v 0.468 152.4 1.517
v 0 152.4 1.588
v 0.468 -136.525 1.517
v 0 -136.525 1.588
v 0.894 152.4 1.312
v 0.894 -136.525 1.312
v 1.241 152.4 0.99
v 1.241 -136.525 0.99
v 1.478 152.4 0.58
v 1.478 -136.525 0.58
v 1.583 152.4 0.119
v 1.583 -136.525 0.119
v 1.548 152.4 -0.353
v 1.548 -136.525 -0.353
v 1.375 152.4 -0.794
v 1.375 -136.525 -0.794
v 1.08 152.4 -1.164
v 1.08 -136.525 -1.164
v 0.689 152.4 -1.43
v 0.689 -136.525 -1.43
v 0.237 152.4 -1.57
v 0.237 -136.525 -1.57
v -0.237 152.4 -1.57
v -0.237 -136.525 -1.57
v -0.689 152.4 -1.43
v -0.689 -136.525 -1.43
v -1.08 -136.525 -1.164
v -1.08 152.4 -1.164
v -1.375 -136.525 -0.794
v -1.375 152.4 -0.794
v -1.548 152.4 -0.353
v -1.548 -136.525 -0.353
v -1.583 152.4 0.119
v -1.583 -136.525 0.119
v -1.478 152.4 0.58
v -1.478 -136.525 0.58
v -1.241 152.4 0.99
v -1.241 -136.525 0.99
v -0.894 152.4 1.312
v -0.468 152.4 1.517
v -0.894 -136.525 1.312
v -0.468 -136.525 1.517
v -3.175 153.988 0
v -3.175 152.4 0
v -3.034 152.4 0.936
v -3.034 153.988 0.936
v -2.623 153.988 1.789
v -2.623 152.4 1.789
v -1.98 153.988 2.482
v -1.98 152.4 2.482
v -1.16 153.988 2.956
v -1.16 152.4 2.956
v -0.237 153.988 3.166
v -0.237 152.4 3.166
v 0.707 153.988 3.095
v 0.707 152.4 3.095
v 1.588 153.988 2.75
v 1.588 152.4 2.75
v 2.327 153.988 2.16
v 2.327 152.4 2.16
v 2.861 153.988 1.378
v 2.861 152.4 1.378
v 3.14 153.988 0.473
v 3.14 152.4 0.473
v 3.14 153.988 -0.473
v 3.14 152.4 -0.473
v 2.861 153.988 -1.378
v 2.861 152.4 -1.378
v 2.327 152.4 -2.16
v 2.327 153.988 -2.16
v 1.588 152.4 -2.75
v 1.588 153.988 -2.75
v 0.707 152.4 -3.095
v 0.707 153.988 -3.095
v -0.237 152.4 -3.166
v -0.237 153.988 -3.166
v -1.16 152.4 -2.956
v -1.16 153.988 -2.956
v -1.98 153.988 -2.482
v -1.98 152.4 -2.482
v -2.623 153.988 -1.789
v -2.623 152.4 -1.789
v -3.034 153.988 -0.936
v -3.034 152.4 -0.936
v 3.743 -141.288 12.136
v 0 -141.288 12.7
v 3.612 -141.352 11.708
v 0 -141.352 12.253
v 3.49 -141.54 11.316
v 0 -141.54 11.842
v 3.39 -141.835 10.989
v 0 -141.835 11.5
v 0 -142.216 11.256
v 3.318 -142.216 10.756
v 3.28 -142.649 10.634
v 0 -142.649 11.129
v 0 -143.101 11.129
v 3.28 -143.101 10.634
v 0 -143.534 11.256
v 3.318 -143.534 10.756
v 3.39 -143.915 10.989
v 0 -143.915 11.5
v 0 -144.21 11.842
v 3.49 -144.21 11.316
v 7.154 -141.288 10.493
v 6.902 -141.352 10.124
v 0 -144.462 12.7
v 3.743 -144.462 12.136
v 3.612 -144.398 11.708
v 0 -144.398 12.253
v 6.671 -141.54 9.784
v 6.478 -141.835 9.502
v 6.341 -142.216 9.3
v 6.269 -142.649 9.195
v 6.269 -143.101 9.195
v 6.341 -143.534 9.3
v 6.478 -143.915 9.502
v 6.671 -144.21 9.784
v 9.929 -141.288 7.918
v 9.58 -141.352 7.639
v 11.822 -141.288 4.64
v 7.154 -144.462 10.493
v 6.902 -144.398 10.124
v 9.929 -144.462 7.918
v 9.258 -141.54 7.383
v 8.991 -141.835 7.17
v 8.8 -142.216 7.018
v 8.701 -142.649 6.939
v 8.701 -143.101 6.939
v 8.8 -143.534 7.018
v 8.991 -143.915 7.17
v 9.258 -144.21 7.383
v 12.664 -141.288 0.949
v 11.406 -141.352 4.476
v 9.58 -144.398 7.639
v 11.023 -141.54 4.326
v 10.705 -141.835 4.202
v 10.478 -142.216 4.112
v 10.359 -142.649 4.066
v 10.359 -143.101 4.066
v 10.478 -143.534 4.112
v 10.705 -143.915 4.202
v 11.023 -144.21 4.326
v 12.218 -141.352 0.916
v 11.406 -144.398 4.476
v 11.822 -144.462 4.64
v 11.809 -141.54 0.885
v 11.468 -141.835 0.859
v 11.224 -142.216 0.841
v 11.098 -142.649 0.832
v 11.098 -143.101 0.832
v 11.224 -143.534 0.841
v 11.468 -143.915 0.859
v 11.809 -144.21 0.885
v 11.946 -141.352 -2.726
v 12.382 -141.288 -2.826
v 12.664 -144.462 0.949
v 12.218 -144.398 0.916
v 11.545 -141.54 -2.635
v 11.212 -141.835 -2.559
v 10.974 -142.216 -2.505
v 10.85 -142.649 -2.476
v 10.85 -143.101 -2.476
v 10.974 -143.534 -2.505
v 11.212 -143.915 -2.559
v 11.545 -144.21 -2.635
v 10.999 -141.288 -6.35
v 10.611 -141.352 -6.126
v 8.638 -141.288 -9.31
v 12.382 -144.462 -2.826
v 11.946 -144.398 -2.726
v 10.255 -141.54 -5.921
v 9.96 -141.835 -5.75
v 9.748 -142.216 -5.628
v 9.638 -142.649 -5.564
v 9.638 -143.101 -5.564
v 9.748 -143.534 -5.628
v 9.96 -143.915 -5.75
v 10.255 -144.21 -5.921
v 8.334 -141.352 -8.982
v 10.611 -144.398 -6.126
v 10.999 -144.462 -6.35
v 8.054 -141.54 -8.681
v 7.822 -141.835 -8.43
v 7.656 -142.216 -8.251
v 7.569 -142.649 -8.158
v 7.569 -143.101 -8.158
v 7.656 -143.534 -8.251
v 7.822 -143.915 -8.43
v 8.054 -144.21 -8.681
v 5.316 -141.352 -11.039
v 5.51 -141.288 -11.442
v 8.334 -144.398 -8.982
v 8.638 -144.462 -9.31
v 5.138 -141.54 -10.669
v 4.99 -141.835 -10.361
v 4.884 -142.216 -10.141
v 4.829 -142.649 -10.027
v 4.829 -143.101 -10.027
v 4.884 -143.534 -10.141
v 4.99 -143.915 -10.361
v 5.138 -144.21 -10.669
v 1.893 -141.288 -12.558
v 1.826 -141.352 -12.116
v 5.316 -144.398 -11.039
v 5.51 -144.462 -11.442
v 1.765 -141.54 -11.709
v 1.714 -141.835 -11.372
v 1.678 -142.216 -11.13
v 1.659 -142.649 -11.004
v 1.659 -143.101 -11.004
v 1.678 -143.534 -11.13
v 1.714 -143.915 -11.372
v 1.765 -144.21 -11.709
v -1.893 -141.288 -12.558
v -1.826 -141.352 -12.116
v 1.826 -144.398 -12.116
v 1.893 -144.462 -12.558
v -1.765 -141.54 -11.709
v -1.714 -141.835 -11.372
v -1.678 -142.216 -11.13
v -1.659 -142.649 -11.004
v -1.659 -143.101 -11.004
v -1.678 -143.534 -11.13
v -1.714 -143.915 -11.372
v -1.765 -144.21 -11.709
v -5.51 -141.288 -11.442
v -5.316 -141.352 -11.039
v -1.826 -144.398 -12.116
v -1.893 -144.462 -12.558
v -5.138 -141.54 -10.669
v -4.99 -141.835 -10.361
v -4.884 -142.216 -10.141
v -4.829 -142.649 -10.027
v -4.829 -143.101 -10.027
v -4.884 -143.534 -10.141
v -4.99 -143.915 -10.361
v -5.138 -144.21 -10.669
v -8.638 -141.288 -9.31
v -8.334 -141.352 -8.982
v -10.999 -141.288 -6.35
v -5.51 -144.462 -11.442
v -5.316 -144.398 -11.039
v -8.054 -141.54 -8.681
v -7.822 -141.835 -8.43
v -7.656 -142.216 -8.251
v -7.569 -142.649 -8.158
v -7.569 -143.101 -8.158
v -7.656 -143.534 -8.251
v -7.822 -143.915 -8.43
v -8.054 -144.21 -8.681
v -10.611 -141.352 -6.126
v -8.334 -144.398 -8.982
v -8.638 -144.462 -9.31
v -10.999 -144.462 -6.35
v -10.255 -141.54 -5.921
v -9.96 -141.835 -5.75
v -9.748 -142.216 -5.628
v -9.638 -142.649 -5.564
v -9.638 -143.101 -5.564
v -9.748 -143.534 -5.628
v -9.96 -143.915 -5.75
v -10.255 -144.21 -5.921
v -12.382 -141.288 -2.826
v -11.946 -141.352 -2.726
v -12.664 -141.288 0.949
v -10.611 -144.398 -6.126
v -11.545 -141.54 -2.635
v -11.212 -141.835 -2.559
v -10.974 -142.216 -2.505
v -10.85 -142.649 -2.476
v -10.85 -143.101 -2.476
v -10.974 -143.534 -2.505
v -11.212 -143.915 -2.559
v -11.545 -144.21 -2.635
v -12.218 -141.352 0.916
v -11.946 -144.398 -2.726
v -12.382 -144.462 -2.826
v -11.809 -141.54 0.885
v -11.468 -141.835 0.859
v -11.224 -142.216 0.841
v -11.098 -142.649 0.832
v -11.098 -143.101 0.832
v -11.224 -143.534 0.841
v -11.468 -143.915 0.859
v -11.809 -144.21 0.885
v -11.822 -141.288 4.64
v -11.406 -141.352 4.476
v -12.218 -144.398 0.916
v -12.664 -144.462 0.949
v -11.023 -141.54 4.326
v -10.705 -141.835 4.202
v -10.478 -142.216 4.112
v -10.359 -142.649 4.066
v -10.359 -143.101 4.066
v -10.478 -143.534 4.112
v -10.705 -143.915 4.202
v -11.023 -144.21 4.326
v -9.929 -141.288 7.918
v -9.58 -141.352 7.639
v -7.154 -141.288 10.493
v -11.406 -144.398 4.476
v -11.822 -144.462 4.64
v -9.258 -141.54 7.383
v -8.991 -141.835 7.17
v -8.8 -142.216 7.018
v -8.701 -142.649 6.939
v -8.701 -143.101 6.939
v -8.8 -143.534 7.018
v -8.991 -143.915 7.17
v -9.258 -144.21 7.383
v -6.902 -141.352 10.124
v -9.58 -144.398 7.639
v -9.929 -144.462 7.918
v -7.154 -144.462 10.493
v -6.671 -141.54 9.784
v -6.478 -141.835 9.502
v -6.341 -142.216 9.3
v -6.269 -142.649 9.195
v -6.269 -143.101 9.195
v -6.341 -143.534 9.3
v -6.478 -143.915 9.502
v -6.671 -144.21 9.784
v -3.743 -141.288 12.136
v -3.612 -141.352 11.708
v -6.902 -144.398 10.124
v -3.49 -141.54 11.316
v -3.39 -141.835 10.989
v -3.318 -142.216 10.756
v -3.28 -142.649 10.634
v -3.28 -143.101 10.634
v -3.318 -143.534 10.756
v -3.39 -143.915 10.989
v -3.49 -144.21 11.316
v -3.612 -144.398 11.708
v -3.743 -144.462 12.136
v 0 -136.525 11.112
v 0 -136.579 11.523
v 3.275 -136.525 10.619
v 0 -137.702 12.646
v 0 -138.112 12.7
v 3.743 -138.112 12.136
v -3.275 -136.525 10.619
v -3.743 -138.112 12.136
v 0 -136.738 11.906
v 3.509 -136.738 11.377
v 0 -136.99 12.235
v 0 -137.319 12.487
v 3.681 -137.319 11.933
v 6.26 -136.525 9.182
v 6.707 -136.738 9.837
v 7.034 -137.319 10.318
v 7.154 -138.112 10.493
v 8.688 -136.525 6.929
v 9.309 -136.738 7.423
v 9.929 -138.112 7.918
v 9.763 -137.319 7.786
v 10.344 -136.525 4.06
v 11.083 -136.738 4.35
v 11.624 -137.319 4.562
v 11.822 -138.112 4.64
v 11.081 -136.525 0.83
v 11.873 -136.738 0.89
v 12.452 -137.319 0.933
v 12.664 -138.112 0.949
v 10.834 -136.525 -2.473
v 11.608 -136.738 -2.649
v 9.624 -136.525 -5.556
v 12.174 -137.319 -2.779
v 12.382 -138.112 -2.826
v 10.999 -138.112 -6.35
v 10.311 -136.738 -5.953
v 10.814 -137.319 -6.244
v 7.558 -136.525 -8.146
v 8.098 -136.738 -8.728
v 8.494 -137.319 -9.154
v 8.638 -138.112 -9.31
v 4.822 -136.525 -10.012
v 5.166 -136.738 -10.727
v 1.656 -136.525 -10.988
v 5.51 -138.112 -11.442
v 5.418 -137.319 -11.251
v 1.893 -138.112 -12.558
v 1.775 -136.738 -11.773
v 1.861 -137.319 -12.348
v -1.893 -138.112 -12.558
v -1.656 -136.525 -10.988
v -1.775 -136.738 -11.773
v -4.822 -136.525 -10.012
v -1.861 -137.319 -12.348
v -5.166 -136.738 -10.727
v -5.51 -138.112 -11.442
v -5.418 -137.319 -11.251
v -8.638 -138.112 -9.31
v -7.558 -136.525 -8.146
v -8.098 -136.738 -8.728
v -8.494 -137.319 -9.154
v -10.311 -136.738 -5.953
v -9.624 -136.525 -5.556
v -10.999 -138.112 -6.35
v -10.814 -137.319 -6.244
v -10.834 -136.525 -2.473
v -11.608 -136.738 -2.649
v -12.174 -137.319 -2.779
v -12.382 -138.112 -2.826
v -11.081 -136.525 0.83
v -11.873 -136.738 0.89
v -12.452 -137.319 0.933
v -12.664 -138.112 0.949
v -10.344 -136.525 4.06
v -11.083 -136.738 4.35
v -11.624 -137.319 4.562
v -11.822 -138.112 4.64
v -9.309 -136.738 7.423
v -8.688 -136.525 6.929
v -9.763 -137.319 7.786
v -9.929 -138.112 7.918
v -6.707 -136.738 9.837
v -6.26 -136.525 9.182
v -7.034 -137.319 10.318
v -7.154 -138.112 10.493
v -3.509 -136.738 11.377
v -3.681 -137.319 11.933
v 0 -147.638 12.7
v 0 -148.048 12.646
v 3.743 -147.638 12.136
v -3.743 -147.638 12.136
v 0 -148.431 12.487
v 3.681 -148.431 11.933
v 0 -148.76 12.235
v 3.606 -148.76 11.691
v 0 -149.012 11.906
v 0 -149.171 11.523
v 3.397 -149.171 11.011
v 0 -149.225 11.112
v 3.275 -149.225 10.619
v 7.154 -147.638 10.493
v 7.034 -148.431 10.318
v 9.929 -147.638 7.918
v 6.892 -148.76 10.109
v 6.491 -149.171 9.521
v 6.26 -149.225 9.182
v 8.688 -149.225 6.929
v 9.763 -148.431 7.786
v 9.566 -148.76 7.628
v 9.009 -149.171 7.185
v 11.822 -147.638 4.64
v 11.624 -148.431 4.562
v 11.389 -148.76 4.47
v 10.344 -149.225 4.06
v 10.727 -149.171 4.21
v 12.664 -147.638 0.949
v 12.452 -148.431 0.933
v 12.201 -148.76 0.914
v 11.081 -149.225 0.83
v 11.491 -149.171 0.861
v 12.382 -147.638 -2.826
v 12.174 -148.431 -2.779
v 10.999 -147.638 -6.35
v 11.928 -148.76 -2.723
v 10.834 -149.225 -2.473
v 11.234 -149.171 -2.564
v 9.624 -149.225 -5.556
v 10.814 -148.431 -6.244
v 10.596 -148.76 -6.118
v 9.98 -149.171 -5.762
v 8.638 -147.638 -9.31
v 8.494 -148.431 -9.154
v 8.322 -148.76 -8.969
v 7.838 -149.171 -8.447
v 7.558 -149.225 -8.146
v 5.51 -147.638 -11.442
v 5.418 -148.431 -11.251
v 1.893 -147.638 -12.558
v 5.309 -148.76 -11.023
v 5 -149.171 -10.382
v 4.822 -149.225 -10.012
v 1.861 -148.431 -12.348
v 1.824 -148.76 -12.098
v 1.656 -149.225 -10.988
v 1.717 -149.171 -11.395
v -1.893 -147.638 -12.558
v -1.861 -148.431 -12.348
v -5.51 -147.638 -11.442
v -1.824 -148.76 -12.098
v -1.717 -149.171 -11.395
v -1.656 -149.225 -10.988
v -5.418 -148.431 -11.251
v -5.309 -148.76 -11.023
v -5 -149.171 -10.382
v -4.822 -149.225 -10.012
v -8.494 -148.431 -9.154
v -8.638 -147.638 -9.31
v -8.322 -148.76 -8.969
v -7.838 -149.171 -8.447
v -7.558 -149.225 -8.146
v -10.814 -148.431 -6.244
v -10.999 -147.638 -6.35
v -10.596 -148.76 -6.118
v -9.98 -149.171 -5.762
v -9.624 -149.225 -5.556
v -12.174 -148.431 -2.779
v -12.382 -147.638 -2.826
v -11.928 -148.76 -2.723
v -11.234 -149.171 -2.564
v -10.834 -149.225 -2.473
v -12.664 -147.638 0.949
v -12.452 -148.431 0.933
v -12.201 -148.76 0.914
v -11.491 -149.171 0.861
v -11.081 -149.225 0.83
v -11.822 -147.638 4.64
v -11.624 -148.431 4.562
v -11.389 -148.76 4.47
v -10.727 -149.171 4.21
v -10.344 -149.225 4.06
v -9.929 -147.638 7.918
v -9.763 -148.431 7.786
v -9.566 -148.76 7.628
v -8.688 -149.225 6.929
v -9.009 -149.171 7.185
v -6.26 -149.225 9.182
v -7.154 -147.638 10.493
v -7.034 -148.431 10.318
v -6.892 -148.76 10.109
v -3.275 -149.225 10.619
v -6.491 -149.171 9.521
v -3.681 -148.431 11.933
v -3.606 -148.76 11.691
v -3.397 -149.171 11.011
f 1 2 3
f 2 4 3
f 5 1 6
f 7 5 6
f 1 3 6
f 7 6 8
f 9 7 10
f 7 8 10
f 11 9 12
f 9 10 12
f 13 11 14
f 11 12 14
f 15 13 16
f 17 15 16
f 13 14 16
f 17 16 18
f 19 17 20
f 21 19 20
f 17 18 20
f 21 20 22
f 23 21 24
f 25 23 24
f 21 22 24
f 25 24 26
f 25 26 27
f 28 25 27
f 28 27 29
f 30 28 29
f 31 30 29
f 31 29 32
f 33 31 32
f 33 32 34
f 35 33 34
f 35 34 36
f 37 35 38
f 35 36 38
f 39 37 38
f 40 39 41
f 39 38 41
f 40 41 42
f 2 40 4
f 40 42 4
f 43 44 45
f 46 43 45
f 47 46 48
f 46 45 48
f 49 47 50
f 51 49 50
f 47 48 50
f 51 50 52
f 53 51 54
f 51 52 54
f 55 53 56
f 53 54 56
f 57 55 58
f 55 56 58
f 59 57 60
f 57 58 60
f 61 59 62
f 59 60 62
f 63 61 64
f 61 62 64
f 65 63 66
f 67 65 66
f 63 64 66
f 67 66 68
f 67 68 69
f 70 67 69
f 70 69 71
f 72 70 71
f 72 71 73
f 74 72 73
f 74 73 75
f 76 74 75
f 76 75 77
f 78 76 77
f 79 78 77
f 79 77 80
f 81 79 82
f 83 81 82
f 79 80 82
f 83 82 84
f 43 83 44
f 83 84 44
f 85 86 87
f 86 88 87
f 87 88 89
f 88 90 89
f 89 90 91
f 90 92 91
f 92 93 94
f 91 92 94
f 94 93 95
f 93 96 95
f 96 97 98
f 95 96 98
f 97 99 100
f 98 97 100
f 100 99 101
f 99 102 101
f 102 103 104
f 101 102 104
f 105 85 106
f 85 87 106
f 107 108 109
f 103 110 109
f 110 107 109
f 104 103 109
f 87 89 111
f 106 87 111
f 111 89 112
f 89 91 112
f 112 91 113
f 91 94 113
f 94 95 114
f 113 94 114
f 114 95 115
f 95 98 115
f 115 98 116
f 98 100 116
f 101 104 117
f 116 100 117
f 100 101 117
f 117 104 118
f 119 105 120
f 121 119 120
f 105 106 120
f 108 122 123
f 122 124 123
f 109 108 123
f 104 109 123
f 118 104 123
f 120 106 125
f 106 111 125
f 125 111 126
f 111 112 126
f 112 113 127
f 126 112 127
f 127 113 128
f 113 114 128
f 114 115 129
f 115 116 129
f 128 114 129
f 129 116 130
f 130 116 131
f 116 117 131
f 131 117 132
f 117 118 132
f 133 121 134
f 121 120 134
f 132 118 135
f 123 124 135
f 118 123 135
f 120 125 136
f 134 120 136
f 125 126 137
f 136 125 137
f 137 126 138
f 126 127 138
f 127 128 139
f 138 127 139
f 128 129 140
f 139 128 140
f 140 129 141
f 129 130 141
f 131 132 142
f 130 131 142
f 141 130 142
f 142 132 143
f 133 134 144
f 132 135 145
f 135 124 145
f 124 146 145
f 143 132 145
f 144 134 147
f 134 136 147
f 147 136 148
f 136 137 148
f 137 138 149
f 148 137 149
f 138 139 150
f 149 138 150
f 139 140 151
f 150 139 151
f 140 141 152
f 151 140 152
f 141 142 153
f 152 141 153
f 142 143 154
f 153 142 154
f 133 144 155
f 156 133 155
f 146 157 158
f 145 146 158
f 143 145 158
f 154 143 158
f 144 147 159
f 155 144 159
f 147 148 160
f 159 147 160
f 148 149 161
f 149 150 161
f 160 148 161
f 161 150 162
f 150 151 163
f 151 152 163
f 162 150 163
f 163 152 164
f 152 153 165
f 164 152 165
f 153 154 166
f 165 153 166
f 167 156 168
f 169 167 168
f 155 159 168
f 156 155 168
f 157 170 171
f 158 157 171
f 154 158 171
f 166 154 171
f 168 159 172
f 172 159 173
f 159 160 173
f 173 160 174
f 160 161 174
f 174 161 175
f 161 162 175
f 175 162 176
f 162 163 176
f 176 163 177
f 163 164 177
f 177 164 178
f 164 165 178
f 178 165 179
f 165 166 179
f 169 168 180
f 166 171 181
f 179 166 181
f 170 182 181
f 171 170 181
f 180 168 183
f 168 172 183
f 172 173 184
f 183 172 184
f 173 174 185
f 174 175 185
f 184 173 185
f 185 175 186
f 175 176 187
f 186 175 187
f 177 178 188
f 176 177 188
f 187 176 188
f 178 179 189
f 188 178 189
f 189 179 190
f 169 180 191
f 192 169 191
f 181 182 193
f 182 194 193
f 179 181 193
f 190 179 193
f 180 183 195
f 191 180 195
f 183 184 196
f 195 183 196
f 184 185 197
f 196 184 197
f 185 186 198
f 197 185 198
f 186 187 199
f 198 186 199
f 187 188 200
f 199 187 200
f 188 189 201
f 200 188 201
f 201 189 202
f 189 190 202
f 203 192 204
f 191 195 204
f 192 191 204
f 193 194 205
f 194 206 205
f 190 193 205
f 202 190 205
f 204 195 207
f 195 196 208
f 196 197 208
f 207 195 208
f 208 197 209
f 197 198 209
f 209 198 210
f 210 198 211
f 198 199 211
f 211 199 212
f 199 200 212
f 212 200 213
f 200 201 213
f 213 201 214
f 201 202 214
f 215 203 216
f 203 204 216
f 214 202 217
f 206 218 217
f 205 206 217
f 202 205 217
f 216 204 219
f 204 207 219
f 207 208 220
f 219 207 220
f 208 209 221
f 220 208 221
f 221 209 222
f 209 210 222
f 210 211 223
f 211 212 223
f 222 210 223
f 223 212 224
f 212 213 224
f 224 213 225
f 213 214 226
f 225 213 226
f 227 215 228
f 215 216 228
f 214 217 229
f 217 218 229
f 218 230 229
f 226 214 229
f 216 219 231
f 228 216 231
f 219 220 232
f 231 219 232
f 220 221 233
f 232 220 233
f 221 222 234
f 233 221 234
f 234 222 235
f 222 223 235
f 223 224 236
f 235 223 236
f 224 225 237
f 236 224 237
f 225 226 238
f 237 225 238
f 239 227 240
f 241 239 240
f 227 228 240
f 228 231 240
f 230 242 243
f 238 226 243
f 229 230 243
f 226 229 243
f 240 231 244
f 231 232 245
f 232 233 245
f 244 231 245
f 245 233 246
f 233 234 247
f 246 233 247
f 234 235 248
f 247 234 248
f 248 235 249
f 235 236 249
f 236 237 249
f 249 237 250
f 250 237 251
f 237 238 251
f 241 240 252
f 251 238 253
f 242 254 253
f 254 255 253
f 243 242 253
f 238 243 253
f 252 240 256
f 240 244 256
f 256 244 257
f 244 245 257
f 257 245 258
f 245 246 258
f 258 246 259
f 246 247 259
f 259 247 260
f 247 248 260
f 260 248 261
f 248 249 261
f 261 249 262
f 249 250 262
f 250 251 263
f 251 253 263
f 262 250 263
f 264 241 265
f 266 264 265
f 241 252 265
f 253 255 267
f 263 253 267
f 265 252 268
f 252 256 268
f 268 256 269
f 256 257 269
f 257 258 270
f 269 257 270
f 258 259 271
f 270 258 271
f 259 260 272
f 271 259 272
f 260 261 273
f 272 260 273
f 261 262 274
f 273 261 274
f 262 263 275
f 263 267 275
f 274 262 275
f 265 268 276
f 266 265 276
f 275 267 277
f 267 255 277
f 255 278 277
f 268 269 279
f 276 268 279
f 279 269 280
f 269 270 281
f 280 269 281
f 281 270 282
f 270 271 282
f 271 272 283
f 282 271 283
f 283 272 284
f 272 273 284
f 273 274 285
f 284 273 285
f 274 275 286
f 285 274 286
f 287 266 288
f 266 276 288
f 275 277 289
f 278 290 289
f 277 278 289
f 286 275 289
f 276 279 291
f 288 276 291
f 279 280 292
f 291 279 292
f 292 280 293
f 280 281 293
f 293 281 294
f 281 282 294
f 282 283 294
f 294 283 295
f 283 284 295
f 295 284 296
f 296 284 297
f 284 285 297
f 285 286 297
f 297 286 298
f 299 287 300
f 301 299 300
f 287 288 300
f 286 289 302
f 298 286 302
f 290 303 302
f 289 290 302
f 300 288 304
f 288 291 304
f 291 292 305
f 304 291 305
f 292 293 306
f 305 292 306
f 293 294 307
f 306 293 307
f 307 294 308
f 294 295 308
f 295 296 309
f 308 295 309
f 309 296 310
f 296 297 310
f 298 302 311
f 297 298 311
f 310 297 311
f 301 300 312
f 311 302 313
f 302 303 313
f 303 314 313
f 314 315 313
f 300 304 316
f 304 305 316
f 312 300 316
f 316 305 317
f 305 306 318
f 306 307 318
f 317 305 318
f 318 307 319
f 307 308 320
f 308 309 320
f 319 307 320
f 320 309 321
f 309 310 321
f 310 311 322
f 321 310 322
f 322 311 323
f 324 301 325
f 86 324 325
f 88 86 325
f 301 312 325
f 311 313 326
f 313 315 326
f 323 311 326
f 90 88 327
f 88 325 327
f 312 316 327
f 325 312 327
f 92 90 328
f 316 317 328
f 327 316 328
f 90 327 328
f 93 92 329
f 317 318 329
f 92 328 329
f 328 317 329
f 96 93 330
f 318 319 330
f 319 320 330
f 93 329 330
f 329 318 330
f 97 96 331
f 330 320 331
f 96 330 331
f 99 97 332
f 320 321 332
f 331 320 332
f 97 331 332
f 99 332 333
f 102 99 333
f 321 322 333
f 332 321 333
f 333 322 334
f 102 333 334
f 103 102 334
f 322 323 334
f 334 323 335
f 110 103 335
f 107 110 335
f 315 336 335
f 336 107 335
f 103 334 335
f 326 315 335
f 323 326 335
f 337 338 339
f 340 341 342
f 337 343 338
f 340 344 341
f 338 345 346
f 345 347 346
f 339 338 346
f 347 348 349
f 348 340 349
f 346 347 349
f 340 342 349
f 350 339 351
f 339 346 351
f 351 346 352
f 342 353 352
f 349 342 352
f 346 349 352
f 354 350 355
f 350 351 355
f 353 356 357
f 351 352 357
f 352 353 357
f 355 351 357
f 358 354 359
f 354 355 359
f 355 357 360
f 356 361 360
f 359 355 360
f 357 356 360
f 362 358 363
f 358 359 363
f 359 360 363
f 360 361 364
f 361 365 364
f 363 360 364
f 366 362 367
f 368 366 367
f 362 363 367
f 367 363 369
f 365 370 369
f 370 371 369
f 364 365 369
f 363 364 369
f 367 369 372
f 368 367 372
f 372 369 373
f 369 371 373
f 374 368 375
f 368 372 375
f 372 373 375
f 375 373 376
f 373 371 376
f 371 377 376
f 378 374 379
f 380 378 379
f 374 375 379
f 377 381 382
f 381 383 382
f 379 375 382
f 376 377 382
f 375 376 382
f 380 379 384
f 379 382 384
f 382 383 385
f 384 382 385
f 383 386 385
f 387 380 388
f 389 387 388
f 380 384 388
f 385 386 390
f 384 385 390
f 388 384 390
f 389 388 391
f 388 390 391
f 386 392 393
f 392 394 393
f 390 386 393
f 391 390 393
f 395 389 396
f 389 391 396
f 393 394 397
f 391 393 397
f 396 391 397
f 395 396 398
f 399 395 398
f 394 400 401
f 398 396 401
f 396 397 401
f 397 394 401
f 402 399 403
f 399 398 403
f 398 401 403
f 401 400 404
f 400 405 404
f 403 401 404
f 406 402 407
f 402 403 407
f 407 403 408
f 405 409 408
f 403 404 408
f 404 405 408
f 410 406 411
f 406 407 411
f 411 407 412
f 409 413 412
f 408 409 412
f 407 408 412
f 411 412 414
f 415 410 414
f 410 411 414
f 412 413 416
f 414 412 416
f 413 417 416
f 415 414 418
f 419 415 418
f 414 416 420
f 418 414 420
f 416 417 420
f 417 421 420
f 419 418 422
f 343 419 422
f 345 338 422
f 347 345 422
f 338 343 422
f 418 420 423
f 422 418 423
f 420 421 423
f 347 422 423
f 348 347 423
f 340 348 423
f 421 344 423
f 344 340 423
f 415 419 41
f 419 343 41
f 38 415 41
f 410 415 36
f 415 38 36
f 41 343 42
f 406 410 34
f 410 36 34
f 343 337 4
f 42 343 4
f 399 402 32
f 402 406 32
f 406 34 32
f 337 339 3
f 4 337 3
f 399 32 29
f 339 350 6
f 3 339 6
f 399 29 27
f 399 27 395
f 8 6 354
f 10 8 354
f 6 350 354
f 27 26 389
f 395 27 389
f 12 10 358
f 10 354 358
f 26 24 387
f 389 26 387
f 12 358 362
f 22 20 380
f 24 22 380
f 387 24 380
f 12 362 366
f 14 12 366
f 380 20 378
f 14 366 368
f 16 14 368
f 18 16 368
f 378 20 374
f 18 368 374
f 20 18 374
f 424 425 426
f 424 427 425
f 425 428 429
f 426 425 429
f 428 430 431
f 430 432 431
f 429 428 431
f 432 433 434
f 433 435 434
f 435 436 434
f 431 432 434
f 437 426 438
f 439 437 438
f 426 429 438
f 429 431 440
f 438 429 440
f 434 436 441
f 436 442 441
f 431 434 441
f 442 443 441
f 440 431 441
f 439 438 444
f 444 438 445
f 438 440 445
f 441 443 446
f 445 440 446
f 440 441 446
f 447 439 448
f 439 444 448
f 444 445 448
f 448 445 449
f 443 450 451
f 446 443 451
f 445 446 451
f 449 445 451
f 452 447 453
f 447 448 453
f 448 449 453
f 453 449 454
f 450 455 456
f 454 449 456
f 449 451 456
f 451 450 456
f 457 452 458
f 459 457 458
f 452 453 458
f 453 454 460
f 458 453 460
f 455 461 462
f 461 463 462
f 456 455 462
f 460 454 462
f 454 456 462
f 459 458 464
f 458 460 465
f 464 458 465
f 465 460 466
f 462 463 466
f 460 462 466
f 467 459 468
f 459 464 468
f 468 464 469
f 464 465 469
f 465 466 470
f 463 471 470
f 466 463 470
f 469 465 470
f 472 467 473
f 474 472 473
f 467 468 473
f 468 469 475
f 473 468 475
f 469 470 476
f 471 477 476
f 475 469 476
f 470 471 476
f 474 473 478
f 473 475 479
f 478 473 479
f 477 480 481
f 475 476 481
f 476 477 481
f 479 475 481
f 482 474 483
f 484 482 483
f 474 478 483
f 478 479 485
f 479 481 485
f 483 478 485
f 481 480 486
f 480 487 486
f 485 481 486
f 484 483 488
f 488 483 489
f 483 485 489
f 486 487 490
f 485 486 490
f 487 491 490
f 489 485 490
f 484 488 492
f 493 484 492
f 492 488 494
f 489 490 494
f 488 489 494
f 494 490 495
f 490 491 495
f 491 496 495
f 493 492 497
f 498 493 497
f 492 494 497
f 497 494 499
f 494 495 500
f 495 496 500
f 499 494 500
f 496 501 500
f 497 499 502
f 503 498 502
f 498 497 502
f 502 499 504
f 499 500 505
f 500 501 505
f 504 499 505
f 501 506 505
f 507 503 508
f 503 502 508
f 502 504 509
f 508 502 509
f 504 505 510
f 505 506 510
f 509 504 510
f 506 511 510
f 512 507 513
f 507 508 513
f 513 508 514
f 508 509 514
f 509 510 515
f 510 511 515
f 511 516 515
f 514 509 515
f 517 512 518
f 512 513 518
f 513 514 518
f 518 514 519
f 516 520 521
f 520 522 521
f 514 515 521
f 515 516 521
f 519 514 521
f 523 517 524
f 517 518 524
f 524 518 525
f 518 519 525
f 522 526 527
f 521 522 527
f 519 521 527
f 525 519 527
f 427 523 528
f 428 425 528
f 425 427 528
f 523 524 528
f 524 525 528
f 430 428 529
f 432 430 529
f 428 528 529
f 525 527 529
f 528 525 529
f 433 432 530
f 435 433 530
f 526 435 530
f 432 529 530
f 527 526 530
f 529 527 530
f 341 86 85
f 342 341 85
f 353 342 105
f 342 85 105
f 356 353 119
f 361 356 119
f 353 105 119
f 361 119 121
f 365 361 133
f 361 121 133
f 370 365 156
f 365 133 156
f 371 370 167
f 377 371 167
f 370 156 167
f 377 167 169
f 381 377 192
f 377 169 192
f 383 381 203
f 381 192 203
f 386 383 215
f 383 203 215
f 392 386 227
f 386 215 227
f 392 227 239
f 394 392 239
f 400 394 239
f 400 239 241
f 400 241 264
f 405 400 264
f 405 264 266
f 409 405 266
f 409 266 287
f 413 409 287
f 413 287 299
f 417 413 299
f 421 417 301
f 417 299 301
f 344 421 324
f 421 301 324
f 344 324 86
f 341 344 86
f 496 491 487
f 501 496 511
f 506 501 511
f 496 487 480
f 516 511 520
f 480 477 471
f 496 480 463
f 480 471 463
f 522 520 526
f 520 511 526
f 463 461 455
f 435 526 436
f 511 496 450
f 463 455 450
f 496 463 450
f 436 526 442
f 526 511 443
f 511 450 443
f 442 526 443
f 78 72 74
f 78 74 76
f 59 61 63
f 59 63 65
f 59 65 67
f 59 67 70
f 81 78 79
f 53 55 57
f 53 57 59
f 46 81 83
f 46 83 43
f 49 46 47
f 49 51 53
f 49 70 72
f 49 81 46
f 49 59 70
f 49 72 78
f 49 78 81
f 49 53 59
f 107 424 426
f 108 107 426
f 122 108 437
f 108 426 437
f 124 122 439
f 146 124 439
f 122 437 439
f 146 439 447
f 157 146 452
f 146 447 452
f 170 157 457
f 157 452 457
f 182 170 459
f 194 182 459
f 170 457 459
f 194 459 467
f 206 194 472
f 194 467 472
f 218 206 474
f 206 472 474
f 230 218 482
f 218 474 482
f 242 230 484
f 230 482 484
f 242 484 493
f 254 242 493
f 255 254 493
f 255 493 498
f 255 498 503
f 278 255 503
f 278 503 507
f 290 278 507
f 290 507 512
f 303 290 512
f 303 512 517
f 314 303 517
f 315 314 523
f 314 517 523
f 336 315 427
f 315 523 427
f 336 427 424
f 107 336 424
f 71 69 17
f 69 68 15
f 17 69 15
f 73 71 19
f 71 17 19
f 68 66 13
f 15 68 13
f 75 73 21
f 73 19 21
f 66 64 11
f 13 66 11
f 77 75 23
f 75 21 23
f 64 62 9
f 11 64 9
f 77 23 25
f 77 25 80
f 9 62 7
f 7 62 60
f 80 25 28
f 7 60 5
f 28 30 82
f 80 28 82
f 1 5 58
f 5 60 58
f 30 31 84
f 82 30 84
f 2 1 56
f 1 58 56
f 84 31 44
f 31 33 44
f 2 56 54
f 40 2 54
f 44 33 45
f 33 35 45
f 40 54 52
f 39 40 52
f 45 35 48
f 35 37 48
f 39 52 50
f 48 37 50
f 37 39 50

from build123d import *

# Parameters (mm, degrees)
F2_R     = 1.5875
F3_R     = 3.175
F4_DEPTH = 1.5875


with BuildPart() as f1:
    # F0 (on Right) → F1 (revolve)
    with BuildSketch(Plane.YZ):
        with BuildLine():
            Line((-144.4625, 12.7), (-149.225, 12.7))
            Line((-149.225, 12.7), (-149.225, 0))
            Line((-149.225, 0), (-136.525, 0))
            Line((-136.525, 0), (152.4, 0))
            Line((152.4, 0), (152.4, 1.5875))
            Line((152.4, 1.5875), (-136.525, 1.5875))
            Line((-136.525, 1.5875), (-136.525, 12.7))
            Line((-136.525, 12.7), (-141.2875, 12.7))
            ThreePointArc((-141.2875, 12.7), (-142.875, 11.1125), (-144.4625, 12.7))
        make_face()
    revolve(axis=Axis((0, 7.9375, 0), (0, 1, 0)))

    # F2
    f2_edges = [f1.edges().sort_by_distance(p)[0] for p in [
        (0, -136.525, -12.7),
        (0, -149.225, -12.7),
    ]]
    fillet(f2_edges, radius=F2_R)

    # F3 (on face) → F4 (join)
    with BuildSketch(Plane(origin=(0, 152.4, 0), x_dir=(-1, 0, 0), z_dir=(0, 1, 0))):
        Circle(F3_R)
    extrude(amount=F4_DEPTH)


solid = f1.part
